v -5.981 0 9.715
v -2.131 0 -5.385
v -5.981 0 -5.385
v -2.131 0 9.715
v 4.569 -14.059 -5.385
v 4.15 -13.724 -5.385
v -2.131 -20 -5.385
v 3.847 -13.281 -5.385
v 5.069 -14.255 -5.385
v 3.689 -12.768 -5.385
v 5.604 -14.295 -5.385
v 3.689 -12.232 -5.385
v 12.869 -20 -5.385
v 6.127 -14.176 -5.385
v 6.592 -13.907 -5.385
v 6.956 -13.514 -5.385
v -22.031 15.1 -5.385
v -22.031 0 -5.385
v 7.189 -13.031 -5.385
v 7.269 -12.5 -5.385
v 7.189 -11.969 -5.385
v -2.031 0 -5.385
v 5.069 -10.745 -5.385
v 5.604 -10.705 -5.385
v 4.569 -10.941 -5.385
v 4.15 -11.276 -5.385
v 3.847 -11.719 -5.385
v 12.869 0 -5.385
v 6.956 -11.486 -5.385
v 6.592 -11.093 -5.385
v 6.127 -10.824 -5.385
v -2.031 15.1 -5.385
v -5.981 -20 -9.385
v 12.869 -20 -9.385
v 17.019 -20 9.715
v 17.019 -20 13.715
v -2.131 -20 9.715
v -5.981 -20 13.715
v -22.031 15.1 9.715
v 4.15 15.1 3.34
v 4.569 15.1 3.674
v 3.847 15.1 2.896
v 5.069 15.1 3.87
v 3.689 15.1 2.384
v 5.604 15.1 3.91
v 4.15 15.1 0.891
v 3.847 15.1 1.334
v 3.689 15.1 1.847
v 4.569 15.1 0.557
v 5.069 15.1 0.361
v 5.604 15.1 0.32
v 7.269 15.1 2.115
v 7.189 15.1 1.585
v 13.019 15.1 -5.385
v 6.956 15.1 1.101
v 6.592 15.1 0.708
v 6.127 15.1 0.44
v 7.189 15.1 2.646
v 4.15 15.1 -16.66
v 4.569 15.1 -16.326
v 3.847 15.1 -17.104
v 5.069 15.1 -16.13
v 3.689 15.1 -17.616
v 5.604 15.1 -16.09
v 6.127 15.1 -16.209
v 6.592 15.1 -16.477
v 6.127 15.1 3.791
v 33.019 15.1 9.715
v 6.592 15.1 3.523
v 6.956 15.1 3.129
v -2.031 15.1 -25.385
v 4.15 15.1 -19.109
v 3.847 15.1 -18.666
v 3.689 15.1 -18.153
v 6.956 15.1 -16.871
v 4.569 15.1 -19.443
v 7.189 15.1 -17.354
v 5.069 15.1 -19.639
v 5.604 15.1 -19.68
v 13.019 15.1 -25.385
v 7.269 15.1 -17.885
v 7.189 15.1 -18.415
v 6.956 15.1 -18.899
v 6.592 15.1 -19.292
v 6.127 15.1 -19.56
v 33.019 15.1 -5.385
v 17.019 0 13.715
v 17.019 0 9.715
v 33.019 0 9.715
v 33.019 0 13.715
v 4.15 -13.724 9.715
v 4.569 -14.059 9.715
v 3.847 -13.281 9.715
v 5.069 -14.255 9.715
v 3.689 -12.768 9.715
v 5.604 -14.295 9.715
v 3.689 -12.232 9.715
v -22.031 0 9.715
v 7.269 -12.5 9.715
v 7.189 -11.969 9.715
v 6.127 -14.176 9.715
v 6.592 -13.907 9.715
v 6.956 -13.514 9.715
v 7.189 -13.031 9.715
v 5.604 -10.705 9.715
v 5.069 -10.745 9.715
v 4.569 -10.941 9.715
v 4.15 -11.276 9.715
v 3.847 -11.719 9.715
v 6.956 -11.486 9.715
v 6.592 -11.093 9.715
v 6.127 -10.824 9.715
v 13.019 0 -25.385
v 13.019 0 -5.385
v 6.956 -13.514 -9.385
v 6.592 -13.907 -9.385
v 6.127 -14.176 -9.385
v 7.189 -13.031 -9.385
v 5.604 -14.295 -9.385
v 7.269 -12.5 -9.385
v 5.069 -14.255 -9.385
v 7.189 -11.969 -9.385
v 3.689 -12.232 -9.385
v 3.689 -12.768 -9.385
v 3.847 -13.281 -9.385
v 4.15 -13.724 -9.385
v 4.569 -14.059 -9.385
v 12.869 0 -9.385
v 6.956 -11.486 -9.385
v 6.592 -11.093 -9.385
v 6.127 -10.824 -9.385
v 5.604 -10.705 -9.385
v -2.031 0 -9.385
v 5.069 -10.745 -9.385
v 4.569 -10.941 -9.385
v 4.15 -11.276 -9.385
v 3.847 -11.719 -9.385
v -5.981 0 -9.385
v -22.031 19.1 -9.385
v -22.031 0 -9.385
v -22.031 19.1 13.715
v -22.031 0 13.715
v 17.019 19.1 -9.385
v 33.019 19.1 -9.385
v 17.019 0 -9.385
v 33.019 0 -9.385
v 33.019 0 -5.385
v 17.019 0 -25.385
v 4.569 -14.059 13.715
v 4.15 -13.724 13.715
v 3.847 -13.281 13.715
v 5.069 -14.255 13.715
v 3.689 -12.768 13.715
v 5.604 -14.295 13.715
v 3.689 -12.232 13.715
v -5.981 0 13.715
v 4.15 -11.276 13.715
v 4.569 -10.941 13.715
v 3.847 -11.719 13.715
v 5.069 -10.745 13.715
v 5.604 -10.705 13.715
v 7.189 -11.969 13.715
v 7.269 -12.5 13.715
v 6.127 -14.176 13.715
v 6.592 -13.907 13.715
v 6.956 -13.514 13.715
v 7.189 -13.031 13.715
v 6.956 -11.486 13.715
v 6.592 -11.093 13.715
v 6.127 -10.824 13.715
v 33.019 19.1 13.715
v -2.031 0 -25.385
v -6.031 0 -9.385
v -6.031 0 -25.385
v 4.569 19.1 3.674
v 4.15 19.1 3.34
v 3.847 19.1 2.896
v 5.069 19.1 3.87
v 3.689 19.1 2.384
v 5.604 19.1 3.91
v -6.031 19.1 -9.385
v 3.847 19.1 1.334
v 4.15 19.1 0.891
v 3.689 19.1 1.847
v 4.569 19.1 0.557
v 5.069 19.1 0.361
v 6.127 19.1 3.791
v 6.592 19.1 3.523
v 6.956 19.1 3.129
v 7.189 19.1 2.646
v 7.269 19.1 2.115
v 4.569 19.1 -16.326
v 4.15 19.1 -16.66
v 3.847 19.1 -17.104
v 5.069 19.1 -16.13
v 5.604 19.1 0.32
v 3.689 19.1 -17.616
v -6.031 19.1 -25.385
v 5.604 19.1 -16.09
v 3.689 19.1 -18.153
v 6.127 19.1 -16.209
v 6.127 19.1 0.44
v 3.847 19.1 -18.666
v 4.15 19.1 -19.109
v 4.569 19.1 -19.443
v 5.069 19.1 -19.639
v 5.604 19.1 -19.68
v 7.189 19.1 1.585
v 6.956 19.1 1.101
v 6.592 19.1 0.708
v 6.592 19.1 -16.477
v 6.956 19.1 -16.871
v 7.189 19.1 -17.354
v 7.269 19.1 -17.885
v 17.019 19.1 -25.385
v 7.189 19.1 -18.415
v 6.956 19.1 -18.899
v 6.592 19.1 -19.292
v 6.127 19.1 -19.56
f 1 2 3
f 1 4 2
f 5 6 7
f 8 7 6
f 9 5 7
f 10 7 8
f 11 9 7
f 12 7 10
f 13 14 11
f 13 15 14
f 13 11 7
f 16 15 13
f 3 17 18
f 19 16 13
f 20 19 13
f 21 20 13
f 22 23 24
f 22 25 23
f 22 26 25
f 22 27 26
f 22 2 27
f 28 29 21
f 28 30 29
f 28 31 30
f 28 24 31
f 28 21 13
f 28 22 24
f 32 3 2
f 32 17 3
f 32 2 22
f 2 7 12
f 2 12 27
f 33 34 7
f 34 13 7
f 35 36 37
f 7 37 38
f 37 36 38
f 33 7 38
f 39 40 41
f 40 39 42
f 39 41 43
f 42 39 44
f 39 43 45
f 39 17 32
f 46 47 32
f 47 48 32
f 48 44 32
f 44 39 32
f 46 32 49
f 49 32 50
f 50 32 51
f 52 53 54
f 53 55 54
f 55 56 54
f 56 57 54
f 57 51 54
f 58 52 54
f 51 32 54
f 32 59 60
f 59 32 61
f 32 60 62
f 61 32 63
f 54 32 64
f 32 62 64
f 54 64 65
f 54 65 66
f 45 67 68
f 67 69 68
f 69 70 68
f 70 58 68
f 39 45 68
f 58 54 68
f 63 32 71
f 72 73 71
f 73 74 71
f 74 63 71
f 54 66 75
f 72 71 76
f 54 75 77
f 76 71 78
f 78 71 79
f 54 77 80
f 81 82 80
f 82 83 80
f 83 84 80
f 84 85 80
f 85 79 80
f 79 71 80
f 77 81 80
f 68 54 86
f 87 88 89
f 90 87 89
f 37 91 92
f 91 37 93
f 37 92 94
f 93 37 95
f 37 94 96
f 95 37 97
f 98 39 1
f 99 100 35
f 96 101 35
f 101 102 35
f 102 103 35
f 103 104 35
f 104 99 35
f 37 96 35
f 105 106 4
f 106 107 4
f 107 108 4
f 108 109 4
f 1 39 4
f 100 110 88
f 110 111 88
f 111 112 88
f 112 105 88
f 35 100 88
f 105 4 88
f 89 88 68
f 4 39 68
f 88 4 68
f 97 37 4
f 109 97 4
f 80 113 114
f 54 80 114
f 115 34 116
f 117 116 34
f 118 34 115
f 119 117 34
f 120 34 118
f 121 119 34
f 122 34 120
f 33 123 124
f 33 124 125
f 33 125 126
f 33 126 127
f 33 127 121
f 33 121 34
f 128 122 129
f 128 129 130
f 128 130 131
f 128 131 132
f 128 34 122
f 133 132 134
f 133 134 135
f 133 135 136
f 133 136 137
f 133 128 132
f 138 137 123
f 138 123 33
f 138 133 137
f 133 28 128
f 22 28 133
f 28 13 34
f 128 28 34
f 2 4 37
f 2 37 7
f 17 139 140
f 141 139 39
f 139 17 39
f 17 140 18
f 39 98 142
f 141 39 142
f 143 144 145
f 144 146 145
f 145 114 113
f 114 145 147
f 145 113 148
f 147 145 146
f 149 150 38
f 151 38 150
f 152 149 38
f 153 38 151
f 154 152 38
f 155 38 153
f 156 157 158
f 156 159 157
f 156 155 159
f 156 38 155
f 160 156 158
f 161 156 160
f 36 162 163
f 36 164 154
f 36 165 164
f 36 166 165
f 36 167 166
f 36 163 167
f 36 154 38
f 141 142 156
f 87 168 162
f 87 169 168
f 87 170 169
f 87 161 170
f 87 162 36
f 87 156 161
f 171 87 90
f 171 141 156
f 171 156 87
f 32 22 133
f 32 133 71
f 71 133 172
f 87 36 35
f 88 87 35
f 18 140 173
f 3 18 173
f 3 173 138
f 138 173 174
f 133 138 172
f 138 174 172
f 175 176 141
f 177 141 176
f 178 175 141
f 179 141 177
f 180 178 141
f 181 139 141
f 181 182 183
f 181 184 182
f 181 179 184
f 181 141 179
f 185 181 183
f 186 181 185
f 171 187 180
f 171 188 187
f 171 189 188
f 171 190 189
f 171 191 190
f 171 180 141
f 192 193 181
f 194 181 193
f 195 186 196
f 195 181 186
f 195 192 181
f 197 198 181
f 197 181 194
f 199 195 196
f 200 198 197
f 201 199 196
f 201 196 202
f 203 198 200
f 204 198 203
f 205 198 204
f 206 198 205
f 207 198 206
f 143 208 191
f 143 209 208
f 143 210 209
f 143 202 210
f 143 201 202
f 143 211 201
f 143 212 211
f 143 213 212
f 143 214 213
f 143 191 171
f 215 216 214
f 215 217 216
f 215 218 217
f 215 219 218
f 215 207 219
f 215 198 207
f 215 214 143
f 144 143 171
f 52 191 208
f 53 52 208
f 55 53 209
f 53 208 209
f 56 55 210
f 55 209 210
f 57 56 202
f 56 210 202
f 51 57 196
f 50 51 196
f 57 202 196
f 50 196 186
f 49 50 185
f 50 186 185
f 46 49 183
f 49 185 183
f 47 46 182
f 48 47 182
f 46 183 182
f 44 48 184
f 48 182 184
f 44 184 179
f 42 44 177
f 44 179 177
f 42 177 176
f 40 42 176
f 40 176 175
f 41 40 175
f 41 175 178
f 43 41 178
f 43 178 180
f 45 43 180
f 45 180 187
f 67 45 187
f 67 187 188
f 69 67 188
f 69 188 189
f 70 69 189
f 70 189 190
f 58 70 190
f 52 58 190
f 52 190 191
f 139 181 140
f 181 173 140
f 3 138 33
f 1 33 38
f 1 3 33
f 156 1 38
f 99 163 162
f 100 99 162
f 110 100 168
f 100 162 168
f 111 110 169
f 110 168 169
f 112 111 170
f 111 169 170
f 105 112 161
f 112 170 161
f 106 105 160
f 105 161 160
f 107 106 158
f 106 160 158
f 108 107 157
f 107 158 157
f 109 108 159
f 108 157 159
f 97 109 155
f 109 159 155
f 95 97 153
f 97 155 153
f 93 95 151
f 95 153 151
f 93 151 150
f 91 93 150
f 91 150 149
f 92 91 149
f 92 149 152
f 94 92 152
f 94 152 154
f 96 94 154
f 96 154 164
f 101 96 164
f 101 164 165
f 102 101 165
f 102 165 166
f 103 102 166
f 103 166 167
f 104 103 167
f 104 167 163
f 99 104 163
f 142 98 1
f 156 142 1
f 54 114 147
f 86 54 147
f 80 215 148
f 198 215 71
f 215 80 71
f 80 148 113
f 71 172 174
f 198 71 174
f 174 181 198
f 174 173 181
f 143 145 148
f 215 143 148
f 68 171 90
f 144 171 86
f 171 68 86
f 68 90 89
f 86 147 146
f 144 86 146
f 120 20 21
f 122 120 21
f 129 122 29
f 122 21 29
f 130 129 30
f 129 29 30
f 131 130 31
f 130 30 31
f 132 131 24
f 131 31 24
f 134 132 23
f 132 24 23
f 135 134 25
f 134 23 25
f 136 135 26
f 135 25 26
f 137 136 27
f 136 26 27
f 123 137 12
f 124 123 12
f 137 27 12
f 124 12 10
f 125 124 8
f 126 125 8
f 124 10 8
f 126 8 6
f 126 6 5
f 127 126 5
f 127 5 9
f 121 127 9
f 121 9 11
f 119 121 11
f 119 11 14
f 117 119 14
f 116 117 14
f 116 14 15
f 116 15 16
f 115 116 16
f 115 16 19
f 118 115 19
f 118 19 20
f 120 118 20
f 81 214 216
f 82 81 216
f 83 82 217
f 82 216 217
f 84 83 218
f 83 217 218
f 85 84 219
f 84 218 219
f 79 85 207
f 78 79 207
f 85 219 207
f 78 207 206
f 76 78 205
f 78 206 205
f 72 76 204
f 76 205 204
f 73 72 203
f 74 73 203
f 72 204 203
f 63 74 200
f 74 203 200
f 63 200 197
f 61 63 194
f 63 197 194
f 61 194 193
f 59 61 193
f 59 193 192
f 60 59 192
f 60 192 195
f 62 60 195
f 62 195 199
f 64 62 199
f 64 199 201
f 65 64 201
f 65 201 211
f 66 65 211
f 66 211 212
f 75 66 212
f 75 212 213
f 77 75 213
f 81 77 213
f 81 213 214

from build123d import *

# Parameters (mm, degrees)
EXTRUDE_1_DEPTH     = 15.1
EXTRUDE_1_2_DEPTH   = 15.1
SKETCH_1_W          = 55.05
SKETCH_1_H          = 4
EXTRUDE_1_3_DEPTH   = 15.1
SKETCH_2_W          = 4
SKETCH_2_H          = 16
SKETCH_2_W_2        = 19.05
EXTRUDE_2_DEPTH     = 4
EXTRUDE_3_DEPTH     = 20
SKETCH_4_R          = 1.8
CUT_EXTRUDE_1_DEPTH = 20
SKETCH_5_R          = 1.8
CUT_EXTRUDE_2_DEPTH = 27


with BuildPart() as part:
    # 草图1 → 凸台-拉伸1 (new body)
    with BuildSketch(Plane(origin=(0, 0, 0), x_dir=(1, 0, 0), z_dir=(0, 1, 0))):
        Polygon((-6.030769231, 9.384615385), (-22.030769231, 9.384615385), (-22.030769231, 5.384615385), (-6.030769231, 5.384615385), (-2.030769231, 5.384615385), (-2.030769231, 9.384615385), (-2.030769231, 25.384615385), (-6.030769231, 25.384615385), align=None)
    extrude(amount=EXTRUDE_1_DEPTH)



with BuildPart() as body_2:
    # 草图1 → Extrude 1 2 (new body)
    with BuildSketch(Plane(origin=(0, 0, 0), x_dir=(1, 0, 0), z_dir=(0, 1, 0))):
        Polygon((22.665384615, 5.384615385), (33.019230769, 5.384615385), (33.019230769, 9.384615385), (17.019230769, 9.384615385), (17.019230769, 25.384615385), (13.019230769, 25.384615385), (13.019230769, 8.769230769), (13.019230769, 5.384615385), align=None)
    extrude(amount=EXTRUDE_1_2_DEPTH)


with BuildPart() as body_3:
    # 草图1 → Extrude 1 3 (new body)
    with BuildSketch(Plane(origin=(0, 0, 0), x_dir=(1, 0, 0), z_dir=(0, 1, 0))):
        with Locations((5.494230769, -11.715384615)):
            Rectangle(SKETCH_1_W, SKETCH_1_H)
    extrude(amount=EXTRUDE_1_3_DEPTH)


with BuildPart() as part_1:
    add(part.part)

    add(body_2.part)  # 凸台-拉伸2 merges body 2

    add(body_3.part)  # 凸台-拉伸2 merges body 3
    # 草图2 → 凸台-拉伸2 (add)
    with BuildSketch(Plane(origin=(0, 15.1, 0), x_dir=(1, 0, 0), z_dir=(0, 1, 0))):
        with Locations((-4.030769231, 17.384615385)):
            Rectangle(SKETCH_2_W, SKETCH_2_H)
        with Locations((7.494230769, 17.384615385)):
            Rectangle(SKETCH_2_W_2, SKETCH_2_H)
        Polygon((-2.030769231, 5.384615385), (-22.030769231, 5.384615385), (-22.030769231, -13.715384615), (33.019230769, -13.715384615), (33.019230769, 9.384615385), (17.019230769, 9.384615385), (-2.030769231, 9.384615385), align=None)
        Polygon((-6.030769231, 9.384615385), (-22.030769231, 9.384615385), (-22.030769231, 5.384615385), (-2.030769231, 5.384615385), (-2.030769231, 9.384615385), align=None)
    extrude(amount=EXTRUDE_2_DEPTH)

    # 草图3 → 凸台-拉伸3 (add)
    with BuildSketch(Plane.XZ):
        Polygon((12.869230769, -9.384615385), (-5.980769231, -9.384615385), (-5.980769231, 13.715384615), (17.019230769, 13.715384615), (17.019230769, 9.715384615), (13.019230769, 9.715384615), (-2.130769231, 9.715384615), (-2.130769231, -5.384615385), (12.869230769, -5.384615385), align=None)
    extrude(amount=EXTRUDE_3_DEPTH)

    # 草图4 → 切除-拉伸1 (cut)
    with BuildSketch(Plane(origin=(0, 19.1, 0), x_dir=(1, 0, 0), z_dir=(0, 1, 0))):
        with Locations((5.469230769, 17.884615385)):
            Circle(SKETCH_4_R)
        with Locations((5.469230769, -2.115384615)):
            Circle(SKETCH_4_R)
    extrude(amount=-CUT_EXTRUDE_1_DEPTH, mode=Mode.SUBTRACT)

    # 草图5 → 切除-拉伸2 (cut)
    with BuildSketch(Plane.XY.offset(13.715384615)):
        with Locations((5.469230769, -12.5)):
            Circle(SKETCH_5_R)
    extrude(amount=-CUT_EXTRUDE_2_DEPTH, mode=Mode.SUBTRACT)


solid = part_1.part
